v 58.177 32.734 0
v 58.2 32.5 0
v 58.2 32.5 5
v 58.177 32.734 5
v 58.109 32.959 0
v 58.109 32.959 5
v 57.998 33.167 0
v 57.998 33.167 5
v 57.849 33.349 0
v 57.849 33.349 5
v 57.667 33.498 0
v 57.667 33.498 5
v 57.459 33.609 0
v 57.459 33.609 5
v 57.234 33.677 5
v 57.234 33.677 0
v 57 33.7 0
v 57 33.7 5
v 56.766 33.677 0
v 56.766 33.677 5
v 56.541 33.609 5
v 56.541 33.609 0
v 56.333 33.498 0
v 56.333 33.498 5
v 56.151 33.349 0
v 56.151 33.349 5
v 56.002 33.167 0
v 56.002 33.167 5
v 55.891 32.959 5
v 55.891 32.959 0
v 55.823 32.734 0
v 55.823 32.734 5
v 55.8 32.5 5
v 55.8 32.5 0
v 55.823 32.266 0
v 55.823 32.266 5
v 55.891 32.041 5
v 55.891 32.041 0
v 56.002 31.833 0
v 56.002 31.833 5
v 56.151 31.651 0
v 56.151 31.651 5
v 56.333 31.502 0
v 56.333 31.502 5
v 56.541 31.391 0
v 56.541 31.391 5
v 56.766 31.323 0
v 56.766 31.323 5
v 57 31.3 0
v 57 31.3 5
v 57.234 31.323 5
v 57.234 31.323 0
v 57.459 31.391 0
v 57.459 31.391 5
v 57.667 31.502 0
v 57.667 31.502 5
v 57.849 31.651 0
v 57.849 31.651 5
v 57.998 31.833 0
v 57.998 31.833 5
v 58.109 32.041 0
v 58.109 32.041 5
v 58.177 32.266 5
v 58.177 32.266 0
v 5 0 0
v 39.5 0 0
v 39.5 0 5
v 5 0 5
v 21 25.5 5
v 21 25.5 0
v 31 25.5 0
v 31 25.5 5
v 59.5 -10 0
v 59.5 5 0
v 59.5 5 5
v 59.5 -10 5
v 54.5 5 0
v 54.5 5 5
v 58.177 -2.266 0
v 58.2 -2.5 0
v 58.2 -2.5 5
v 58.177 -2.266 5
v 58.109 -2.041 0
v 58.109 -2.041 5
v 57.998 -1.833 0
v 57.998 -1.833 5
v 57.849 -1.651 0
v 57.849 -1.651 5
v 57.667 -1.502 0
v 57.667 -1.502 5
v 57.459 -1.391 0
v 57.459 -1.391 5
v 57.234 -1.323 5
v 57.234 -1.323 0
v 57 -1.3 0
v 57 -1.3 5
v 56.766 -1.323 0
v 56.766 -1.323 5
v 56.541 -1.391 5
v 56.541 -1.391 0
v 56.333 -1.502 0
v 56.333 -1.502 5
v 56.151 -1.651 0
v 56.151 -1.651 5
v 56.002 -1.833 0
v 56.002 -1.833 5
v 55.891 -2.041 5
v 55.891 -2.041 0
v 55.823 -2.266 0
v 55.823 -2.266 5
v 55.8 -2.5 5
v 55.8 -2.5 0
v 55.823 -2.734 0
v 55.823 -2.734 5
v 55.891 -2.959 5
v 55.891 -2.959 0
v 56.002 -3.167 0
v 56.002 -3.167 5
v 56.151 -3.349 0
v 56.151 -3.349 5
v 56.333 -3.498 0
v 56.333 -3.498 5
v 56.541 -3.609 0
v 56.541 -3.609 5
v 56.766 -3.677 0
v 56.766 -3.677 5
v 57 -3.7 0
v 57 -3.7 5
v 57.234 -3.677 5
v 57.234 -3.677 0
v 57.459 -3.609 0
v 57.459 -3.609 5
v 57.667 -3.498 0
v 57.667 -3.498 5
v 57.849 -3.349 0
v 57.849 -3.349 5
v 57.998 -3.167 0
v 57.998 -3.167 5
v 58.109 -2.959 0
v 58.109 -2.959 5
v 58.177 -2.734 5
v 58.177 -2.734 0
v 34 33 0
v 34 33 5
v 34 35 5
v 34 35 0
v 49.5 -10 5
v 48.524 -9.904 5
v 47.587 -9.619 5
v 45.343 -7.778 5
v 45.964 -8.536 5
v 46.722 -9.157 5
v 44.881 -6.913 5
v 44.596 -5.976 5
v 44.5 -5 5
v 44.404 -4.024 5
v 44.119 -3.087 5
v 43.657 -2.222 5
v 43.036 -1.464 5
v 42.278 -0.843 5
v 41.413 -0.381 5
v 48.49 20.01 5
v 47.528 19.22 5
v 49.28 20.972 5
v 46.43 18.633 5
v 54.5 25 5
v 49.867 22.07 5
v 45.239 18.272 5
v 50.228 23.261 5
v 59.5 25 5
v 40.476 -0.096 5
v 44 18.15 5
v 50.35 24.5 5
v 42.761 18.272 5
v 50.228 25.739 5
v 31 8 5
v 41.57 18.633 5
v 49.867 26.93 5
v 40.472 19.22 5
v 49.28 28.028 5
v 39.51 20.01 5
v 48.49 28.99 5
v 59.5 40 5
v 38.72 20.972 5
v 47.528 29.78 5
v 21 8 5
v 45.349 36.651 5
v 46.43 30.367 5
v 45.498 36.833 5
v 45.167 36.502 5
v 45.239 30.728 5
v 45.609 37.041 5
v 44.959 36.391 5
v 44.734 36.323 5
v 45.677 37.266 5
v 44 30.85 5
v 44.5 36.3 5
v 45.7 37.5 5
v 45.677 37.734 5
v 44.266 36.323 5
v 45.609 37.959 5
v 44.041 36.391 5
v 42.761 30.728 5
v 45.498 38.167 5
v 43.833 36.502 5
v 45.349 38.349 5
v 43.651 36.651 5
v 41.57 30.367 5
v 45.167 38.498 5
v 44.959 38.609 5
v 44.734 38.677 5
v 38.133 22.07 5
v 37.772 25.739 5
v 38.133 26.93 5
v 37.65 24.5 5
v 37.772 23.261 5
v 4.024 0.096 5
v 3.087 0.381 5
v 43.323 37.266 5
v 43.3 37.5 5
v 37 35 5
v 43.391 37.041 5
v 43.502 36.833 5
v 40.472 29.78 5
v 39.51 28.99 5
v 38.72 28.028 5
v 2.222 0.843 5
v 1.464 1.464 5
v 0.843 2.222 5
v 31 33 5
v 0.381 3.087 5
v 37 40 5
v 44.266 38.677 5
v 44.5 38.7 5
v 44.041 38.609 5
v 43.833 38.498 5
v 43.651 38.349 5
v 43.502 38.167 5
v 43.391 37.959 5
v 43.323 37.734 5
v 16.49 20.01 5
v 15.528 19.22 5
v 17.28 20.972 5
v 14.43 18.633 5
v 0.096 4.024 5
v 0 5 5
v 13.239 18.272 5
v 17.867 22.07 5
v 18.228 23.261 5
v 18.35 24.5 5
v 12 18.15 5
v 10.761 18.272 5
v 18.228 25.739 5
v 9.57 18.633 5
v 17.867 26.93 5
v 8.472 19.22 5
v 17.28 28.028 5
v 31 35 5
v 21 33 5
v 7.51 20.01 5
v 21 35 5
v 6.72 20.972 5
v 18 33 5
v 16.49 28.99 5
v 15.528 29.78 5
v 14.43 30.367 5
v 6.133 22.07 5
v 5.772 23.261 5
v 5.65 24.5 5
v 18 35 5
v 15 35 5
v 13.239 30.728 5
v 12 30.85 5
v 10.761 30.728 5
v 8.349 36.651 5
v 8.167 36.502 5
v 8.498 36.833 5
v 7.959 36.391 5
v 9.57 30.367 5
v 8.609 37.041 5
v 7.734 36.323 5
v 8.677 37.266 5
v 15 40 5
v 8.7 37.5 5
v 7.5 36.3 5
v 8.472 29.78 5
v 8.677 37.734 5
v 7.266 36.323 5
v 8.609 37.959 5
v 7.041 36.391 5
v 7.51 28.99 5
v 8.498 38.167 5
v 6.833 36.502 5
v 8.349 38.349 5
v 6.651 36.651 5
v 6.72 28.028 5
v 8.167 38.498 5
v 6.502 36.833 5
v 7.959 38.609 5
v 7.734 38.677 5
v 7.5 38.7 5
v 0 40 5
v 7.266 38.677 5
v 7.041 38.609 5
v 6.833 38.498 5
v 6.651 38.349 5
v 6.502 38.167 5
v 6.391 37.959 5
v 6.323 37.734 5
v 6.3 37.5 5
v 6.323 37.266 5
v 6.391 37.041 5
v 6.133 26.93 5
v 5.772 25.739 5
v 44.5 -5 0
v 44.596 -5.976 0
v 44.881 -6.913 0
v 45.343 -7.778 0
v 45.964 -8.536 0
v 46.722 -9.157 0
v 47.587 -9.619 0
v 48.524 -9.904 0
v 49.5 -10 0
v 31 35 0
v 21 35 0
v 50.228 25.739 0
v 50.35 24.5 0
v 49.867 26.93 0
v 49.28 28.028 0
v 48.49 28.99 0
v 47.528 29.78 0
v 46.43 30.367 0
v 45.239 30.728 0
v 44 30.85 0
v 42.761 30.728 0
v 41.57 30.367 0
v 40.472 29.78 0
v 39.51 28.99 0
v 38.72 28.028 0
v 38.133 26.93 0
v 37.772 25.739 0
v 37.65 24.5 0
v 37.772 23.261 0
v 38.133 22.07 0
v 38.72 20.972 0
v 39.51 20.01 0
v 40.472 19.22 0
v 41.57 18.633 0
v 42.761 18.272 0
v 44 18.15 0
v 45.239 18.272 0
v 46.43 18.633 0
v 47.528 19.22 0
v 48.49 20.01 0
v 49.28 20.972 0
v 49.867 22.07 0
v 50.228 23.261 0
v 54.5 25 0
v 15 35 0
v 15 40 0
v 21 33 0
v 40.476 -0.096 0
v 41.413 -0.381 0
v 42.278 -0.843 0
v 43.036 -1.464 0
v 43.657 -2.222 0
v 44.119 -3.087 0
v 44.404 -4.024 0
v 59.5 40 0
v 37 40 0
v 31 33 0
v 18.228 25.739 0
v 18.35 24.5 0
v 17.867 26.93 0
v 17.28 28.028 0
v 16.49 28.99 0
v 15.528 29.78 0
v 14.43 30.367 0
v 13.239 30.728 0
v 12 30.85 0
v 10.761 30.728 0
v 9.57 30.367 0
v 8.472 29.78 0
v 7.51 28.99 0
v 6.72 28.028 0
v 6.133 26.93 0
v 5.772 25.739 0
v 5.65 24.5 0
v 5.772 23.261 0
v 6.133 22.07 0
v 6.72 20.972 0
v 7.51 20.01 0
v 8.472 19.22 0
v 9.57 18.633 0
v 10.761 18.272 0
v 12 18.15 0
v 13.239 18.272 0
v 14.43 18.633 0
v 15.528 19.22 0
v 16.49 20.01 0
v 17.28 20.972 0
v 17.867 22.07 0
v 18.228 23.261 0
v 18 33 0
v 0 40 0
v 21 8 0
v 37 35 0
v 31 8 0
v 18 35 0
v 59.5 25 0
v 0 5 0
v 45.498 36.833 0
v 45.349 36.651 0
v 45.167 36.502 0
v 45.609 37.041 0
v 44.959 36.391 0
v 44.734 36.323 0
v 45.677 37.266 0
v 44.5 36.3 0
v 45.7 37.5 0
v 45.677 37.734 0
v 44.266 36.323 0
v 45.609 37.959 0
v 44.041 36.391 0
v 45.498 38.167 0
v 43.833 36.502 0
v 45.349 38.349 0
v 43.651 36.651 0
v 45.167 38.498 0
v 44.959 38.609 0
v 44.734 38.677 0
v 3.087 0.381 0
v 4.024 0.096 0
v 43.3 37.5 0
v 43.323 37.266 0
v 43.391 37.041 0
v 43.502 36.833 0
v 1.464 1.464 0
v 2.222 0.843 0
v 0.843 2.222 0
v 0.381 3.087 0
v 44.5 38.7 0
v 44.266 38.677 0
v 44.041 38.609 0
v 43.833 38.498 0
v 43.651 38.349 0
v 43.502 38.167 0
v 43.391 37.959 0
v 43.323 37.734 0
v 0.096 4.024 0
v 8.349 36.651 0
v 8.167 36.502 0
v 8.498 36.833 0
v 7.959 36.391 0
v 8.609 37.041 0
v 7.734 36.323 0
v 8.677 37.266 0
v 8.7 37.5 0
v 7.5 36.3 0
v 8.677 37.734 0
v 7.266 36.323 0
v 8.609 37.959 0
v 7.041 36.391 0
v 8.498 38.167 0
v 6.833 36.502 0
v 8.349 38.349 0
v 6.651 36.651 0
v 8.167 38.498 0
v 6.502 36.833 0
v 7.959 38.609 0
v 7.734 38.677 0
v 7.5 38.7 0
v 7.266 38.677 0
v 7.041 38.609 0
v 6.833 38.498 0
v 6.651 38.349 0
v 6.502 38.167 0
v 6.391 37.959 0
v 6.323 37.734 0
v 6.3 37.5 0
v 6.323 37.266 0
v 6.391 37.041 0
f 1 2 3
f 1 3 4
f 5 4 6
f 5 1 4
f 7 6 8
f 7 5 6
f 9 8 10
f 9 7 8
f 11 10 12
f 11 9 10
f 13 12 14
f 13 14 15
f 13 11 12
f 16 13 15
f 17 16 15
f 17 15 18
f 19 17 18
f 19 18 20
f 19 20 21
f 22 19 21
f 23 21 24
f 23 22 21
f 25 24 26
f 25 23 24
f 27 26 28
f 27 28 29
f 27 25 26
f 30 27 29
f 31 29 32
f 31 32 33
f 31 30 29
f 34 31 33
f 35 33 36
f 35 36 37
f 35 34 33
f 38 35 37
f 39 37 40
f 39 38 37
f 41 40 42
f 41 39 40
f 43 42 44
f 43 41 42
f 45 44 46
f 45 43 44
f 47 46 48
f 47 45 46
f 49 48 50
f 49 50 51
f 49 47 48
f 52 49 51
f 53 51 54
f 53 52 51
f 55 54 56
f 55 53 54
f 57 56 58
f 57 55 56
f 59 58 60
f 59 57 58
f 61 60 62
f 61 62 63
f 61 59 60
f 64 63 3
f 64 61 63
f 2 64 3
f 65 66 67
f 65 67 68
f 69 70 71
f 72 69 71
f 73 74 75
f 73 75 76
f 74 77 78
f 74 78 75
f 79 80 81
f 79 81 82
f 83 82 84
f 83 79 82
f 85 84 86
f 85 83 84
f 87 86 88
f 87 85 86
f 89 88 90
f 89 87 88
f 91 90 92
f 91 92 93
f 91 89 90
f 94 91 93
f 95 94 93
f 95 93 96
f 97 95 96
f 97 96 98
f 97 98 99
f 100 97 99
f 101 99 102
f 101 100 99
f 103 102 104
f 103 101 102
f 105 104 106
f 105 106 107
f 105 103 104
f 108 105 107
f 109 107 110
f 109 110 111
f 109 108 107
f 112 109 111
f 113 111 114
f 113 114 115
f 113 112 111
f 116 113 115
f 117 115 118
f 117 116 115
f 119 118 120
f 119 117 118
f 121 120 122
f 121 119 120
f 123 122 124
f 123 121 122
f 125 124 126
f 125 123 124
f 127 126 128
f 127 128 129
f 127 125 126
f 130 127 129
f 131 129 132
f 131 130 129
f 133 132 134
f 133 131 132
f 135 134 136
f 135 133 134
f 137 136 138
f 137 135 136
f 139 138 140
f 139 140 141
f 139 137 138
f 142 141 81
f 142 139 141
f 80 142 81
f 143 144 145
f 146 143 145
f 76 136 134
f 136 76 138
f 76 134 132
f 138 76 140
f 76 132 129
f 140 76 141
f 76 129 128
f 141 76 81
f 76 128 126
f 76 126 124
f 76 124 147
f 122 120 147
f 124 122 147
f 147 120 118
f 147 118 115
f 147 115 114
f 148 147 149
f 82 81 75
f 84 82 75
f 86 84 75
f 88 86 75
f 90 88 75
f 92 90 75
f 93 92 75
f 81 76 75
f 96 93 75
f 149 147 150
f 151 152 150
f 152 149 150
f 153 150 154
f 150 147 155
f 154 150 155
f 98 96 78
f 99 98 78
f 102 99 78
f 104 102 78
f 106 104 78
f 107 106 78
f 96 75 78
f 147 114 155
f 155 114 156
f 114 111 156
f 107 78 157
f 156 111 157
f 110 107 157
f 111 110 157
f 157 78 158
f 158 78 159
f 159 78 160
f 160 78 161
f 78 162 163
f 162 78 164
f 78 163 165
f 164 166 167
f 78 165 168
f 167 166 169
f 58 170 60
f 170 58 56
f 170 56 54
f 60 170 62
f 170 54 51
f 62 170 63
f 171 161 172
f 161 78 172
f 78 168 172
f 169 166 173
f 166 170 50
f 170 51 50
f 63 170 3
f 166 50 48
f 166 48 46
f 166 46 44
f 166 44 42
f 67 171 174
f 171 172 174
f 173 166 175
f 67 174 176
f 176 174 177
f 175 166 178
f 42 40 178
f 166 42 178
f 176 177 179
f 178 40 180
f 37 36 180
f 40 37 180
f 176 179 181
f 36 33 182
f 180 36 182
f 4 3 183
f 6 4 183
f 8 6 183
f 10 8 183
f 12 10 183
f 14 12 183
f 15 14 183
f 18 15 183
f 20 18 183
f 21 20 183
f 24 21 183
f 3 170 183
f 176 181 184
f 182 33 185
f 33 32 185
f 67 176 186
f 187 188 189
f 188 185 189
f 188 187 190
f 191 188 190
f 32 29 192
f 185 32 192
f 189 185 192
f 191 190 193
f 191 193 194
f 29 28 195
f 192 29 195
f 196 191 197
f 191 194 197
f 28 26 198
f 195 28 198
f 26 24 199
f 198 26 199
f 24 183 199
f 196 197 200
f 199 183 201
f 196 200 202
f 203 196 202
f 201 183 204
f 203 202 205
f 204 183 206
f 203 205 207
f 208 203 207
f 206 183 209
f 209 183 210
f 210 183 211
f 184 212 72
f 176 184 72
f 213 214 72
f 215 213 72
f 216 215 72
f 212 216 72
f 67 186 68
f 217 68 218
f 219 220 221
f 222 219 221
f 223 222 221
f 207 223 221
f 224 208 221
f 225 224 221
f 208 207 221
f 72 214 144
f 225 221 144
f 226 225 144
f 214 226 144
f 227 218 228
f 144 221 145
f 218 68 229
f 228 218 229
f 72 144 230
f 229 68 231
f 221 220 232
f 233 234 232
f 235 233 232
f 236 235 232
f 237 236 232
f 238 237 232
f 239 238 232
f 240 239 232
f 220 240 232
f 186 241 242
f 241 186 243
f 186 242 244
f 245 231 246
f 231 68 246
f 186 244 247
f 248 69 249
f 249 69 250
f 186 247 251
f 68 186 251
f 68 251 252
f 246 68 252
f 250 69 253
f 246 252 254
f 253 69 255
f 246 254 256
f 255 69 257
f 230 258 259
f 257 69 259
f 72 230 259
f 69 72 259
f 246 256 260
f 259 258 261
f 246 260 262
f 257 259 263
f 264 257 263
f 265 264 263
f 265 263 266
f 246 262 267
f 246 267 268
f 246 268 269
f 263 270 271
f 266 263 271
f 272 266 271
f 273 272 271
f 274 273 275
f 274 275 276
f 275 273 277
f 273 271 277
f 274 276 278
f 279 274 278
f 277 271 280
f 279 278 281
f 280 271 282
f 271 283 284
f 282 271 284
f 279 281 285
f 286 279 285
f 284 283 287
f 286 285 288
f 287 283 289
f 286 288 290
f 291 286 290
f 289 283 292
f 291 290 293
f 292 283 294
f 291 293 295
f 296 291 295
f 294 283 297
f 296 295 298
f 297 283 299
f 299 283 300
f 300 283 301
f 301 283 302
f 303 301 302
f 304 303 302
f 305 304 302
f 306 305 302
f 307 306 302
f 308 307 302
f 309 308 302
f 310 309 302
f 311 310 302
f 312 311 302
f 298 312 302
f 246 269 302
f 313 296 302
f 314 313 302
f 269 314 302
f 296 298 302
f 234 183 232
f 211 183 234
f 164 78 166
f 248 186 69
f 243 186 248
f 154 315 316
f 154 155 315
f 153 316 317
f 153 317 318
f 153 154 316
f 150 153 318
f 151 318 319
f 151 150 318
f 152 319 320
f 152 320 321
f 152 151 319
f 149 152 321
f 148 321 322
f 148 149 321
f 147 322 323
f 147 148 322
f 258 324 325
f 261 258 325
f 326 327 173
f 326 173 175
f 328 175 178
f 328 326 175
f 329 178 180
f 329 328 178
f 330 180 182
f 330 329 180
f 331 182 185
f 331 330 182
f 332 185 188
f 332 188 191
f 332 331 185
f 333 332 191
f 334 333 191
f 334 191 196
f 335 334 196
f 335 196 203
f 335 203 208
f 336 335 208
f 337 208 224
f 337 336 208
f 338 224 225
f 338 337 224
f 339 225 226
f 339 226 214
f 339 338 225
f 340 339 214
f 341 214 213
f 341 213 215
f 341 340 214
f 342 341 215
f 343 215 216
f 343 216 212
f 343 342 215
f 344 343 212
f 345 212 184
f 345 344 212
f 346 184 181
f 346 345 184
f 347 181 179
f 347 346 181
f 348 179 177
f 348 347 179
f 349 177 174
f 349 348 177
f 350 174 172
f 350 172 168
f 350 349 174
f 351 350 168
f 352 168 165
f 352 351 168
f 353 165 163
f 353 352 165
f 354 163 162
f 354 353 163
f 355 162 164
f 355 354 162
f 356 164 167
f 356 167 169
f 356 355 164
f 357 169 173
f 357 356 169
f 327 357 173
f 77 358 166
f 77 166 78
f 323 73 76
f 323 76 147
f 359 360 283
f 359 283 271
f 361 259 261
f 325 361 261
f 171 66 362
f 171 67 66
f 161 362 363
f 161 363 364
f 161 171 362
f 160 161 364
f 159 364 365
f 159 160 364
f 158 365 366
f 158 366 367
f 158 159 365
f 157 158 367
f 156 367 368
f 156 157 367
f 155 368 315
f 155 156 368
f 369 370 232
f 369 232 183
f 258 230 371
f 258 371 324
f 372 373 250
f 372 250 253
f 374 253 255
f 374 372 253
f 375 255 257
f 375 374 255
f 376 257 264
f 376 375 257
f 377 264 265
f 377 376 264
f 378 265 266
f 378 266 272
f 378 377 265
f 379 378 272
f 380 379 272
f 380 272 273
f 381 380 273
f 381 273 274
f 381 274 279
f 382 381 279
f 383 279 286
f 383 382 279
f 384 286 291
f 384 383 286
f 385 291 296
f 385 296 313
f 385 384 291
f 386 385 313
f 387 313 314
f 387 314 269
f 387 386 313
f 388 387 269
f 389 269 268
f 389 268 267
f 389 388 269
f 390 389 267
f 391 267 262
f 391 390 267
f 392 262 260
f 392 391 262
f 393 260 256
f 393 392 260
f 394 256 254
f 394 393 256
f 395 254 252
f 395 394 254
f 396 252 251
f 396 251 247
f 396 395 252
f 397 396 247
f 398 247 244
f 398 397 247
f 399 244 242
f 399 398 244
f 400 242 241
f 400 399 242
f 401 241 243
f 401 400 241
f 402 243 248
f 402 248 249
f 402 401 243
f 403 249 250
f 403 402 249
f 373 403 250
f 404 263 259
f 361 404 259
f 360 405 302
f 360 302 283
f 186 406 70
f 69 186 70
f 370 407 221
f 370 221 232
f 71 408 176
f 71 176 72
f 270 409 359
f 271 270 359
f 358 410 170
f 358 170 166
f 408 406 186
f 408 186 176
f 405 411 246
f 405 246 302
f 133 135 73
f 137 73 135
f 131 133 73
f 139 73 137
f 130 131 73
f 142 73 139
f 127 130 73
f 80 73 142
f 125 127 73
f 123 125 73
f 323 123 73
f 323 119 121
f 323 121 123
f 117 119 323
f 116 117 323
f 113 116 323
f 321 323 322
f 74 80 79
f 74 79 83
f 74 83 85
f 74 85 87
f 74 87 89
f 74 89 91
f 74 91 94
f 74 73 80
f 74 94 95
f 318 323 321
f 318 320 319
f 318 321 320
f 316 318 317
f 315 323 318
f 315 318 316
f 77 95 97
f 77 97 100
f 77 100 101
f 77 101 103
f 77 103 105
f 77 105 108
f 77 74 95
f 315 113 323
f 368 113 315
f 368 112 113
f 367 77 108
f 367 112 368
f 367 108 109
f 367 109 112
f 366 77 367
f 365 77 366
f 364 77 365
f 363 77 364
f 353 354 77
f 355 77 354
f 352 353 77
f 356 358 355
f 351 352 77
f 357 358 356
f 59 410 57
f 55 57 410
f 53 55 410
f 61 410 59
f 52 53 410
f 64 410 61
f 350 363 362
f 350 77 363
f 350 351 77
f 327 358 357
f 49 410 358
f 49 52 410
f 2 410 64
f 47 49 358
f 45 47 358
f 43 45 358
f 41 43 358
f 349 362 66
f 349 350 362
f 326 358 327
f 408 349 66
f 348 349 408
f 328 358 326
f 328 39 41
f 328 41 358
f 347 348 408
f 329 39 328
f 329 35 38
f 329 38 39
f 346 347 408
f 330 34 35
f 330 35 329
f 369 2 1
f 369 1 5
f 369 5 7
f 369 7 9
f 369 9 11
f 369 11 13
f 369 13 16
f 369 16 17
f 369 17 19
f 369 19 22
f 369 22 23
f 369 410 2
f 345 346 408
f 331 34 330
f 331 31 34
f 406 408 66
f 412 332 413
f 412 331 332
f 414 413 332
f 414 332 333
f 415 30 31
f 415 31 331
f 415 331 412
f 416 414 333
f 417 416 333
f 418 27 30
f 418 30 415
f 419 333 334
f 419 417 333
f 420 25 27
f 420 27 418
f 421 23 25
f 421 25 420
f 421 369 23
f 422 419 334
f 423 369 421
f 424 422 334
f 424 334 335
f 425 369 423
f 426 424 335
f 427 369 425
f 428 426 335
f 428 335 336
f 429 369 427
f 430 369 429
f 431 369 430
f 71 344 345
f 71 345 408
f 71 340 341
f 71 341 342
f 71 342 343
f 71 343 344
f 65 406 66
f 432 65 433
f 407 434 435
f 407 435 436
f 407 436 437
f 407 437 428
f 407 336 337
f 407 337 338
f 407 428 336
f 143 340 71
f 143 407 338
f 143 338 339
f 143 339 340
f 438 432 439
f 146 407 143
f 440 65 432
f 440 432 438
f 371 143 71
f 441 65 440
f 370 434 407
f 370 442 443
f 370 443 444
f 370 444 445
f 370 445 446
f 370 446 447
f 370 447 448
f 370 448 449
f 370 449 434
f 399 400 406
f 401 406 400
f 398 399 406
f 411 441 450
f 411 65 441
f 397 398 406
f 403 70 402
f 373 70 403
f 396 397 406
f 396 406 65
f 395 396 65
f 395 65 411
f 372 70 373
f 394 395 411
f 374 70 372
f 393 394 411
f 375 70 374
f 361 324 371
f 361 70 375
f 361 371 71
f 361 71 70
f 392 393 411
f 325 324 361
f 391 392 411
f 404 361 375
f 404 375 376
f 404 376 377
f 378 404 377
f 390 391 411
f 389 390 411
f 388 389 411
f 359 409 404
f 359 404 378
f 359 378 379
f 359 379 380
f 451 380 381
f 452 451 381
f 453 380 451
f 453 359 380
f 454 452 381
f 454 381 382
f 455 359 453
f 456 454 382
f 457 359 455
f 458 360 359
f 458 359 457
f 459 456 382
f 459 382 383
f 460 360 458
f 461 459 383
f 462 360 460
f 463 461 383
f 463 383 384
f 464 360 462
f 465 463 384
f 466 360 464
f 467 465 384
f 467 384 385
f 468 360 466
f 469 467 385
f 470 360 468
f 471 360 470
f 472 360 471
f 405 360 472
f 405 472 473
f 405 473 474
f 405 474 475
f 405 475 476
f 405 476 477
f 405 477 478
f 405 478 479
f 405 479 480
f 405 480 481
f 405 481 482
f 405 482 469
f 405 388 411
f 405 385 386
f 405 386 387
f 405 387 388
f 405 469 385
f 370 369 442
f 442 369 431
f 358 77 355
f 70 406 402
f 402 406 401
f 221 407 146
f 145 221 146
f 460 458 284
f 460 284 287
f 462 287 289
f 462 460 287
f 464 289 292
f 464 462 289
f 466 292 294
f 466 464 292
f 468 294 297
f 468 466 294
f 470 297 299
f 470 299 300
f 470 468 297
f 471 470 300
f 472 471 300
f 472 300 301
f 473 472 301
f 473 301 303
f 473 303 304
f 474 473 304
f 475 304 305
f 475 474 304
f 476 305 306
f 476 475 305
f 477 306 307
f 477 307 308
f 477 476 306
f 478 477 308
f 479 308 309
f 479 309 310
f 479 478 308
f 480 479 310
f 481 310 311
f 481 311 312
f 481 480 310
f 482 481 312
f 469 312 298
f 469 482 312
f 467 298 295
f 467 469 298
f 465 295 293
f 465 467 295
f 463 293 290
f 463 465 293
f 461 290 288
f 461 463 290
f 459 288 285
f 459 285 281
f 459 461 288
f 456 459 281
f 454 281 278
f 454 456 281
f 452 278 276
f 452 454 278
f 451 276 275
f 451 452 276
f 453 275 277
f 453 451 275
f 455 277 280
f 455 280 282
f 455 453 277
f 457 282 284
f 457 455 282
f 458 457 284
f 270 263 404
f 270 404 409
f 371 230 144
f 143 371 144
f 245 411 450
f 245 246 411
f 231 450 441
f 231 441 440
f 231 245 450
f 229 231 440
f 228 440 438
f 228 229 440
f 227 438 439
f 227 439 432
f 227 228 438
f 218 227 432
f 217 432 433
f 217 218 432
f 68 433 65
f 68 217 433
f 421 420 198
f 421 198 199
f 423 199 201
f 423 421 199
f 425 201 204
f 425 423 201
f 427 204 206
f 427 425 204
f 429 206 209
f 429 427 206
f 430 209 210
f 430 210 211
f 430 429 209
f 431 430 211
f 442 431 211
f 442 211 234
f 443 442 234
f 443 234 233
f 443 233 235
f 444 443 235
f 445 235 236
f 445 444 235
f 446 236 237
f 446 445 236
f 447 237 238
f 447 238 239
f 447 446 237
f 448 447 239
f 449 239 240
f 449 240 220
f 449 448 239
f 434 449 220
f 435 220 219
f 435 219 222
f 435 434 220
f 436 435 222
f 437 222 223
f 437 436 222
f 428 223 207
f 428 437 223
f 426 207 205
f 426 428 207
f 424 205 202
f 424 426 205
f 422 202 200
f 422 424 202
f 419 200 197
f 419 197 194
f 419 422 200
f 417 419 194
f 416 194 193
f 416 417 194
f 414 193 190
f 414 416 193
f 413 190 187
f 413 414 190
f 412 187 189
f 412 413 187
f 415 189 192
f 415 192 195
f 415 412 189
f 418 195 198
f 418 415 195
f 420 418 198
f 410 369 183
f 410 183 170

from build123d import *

# Parameters (mm, degrees)
SKETCH1_R           = 6.35
SKETCH1_R_2         = 1.2
SKETCH1_W           = 10
SKETCH1_H           = 17.5
BOSS_EXTRUDE1_DEPTH = 5
SKETCH2_W           = 3
SKETCH2_H           = 2
CUT_EXTRUDE1_DEPTH  = 72.869673716
FILLET1_R           = 5


with BuildPart() as part:
    # Sketch1 → Boss-Extrude1 (new body)
    with BuildSketch(Plane.XY):
        Polygon((0, 40), (15, 40), (15, 35), (26, 35), (37, 35), (37, 40), (59.5, 40), (59.5, 25), (54.5, 25), (54.5, 5), (59.5, 5), (59.5, -10), (44.5, -10), (44.5, 0), (0, 0), align=None)
        with Locations((12, 24.5)):
            Circle(SKETCH1_R, mode=Mode.SUBTRACT)
        with Locations((44, 24.5)):
            Circle(SKETCH1_R, mode=Mode.SUBTRACT)
        with Locations((7.5, 37.5)):
            Circle(SKETCH1_R_2, mode=Mode.SUBTRACT)
        with Locations((44.5, 37.5)):
            Circle(SKETCH1_R_2, mode=Mode.SUBTRACT)
        with Locations((57, 32.5)):
            Circle(SKETCH1_R_2, mode=Mode.SUBTRACT)
        with Locations((57, -2.5)):
            Circle(SKETCH1_R_2, mode=Mode.SUBTRACT)
        with Locations((26, 16.75)):
            Rectangle(SKETCH1_W, SKETCH1_H, mode=Mode.SUBTRACT)
    extrude(amount=BOSS_EXTRUDE1_DEPTH)

    # Sketch2 → Cut-Extrude1 (cut, through all)
    with BuildSketch(Plane.XY.offset(5)):
        with Locations((19.5, 34)):
            Rectangle(SKETCH2_W, SKETCH2_H)
        with Locations((32.5, 34)):
            Rectangle(SKETCH2_W, SKETCH2_H)
    extrude(amount=-CUT_EXTRUDE1_DEPTH, mode=Mode.SUBTRACT)

    # Fillet1
    fillet1_edges = [part.edges().sort_by_distance(p)[0] for p in [
        (44.5, -10, 2.5),
        (44.5, 0, 2.5),
        (0, 0, 2.5),
    ]]
    fillet(fillet1_edges, radius=FILLET1_R - 0.0001)  # a hair under: the kernel refuses the full size


solid = part.part
